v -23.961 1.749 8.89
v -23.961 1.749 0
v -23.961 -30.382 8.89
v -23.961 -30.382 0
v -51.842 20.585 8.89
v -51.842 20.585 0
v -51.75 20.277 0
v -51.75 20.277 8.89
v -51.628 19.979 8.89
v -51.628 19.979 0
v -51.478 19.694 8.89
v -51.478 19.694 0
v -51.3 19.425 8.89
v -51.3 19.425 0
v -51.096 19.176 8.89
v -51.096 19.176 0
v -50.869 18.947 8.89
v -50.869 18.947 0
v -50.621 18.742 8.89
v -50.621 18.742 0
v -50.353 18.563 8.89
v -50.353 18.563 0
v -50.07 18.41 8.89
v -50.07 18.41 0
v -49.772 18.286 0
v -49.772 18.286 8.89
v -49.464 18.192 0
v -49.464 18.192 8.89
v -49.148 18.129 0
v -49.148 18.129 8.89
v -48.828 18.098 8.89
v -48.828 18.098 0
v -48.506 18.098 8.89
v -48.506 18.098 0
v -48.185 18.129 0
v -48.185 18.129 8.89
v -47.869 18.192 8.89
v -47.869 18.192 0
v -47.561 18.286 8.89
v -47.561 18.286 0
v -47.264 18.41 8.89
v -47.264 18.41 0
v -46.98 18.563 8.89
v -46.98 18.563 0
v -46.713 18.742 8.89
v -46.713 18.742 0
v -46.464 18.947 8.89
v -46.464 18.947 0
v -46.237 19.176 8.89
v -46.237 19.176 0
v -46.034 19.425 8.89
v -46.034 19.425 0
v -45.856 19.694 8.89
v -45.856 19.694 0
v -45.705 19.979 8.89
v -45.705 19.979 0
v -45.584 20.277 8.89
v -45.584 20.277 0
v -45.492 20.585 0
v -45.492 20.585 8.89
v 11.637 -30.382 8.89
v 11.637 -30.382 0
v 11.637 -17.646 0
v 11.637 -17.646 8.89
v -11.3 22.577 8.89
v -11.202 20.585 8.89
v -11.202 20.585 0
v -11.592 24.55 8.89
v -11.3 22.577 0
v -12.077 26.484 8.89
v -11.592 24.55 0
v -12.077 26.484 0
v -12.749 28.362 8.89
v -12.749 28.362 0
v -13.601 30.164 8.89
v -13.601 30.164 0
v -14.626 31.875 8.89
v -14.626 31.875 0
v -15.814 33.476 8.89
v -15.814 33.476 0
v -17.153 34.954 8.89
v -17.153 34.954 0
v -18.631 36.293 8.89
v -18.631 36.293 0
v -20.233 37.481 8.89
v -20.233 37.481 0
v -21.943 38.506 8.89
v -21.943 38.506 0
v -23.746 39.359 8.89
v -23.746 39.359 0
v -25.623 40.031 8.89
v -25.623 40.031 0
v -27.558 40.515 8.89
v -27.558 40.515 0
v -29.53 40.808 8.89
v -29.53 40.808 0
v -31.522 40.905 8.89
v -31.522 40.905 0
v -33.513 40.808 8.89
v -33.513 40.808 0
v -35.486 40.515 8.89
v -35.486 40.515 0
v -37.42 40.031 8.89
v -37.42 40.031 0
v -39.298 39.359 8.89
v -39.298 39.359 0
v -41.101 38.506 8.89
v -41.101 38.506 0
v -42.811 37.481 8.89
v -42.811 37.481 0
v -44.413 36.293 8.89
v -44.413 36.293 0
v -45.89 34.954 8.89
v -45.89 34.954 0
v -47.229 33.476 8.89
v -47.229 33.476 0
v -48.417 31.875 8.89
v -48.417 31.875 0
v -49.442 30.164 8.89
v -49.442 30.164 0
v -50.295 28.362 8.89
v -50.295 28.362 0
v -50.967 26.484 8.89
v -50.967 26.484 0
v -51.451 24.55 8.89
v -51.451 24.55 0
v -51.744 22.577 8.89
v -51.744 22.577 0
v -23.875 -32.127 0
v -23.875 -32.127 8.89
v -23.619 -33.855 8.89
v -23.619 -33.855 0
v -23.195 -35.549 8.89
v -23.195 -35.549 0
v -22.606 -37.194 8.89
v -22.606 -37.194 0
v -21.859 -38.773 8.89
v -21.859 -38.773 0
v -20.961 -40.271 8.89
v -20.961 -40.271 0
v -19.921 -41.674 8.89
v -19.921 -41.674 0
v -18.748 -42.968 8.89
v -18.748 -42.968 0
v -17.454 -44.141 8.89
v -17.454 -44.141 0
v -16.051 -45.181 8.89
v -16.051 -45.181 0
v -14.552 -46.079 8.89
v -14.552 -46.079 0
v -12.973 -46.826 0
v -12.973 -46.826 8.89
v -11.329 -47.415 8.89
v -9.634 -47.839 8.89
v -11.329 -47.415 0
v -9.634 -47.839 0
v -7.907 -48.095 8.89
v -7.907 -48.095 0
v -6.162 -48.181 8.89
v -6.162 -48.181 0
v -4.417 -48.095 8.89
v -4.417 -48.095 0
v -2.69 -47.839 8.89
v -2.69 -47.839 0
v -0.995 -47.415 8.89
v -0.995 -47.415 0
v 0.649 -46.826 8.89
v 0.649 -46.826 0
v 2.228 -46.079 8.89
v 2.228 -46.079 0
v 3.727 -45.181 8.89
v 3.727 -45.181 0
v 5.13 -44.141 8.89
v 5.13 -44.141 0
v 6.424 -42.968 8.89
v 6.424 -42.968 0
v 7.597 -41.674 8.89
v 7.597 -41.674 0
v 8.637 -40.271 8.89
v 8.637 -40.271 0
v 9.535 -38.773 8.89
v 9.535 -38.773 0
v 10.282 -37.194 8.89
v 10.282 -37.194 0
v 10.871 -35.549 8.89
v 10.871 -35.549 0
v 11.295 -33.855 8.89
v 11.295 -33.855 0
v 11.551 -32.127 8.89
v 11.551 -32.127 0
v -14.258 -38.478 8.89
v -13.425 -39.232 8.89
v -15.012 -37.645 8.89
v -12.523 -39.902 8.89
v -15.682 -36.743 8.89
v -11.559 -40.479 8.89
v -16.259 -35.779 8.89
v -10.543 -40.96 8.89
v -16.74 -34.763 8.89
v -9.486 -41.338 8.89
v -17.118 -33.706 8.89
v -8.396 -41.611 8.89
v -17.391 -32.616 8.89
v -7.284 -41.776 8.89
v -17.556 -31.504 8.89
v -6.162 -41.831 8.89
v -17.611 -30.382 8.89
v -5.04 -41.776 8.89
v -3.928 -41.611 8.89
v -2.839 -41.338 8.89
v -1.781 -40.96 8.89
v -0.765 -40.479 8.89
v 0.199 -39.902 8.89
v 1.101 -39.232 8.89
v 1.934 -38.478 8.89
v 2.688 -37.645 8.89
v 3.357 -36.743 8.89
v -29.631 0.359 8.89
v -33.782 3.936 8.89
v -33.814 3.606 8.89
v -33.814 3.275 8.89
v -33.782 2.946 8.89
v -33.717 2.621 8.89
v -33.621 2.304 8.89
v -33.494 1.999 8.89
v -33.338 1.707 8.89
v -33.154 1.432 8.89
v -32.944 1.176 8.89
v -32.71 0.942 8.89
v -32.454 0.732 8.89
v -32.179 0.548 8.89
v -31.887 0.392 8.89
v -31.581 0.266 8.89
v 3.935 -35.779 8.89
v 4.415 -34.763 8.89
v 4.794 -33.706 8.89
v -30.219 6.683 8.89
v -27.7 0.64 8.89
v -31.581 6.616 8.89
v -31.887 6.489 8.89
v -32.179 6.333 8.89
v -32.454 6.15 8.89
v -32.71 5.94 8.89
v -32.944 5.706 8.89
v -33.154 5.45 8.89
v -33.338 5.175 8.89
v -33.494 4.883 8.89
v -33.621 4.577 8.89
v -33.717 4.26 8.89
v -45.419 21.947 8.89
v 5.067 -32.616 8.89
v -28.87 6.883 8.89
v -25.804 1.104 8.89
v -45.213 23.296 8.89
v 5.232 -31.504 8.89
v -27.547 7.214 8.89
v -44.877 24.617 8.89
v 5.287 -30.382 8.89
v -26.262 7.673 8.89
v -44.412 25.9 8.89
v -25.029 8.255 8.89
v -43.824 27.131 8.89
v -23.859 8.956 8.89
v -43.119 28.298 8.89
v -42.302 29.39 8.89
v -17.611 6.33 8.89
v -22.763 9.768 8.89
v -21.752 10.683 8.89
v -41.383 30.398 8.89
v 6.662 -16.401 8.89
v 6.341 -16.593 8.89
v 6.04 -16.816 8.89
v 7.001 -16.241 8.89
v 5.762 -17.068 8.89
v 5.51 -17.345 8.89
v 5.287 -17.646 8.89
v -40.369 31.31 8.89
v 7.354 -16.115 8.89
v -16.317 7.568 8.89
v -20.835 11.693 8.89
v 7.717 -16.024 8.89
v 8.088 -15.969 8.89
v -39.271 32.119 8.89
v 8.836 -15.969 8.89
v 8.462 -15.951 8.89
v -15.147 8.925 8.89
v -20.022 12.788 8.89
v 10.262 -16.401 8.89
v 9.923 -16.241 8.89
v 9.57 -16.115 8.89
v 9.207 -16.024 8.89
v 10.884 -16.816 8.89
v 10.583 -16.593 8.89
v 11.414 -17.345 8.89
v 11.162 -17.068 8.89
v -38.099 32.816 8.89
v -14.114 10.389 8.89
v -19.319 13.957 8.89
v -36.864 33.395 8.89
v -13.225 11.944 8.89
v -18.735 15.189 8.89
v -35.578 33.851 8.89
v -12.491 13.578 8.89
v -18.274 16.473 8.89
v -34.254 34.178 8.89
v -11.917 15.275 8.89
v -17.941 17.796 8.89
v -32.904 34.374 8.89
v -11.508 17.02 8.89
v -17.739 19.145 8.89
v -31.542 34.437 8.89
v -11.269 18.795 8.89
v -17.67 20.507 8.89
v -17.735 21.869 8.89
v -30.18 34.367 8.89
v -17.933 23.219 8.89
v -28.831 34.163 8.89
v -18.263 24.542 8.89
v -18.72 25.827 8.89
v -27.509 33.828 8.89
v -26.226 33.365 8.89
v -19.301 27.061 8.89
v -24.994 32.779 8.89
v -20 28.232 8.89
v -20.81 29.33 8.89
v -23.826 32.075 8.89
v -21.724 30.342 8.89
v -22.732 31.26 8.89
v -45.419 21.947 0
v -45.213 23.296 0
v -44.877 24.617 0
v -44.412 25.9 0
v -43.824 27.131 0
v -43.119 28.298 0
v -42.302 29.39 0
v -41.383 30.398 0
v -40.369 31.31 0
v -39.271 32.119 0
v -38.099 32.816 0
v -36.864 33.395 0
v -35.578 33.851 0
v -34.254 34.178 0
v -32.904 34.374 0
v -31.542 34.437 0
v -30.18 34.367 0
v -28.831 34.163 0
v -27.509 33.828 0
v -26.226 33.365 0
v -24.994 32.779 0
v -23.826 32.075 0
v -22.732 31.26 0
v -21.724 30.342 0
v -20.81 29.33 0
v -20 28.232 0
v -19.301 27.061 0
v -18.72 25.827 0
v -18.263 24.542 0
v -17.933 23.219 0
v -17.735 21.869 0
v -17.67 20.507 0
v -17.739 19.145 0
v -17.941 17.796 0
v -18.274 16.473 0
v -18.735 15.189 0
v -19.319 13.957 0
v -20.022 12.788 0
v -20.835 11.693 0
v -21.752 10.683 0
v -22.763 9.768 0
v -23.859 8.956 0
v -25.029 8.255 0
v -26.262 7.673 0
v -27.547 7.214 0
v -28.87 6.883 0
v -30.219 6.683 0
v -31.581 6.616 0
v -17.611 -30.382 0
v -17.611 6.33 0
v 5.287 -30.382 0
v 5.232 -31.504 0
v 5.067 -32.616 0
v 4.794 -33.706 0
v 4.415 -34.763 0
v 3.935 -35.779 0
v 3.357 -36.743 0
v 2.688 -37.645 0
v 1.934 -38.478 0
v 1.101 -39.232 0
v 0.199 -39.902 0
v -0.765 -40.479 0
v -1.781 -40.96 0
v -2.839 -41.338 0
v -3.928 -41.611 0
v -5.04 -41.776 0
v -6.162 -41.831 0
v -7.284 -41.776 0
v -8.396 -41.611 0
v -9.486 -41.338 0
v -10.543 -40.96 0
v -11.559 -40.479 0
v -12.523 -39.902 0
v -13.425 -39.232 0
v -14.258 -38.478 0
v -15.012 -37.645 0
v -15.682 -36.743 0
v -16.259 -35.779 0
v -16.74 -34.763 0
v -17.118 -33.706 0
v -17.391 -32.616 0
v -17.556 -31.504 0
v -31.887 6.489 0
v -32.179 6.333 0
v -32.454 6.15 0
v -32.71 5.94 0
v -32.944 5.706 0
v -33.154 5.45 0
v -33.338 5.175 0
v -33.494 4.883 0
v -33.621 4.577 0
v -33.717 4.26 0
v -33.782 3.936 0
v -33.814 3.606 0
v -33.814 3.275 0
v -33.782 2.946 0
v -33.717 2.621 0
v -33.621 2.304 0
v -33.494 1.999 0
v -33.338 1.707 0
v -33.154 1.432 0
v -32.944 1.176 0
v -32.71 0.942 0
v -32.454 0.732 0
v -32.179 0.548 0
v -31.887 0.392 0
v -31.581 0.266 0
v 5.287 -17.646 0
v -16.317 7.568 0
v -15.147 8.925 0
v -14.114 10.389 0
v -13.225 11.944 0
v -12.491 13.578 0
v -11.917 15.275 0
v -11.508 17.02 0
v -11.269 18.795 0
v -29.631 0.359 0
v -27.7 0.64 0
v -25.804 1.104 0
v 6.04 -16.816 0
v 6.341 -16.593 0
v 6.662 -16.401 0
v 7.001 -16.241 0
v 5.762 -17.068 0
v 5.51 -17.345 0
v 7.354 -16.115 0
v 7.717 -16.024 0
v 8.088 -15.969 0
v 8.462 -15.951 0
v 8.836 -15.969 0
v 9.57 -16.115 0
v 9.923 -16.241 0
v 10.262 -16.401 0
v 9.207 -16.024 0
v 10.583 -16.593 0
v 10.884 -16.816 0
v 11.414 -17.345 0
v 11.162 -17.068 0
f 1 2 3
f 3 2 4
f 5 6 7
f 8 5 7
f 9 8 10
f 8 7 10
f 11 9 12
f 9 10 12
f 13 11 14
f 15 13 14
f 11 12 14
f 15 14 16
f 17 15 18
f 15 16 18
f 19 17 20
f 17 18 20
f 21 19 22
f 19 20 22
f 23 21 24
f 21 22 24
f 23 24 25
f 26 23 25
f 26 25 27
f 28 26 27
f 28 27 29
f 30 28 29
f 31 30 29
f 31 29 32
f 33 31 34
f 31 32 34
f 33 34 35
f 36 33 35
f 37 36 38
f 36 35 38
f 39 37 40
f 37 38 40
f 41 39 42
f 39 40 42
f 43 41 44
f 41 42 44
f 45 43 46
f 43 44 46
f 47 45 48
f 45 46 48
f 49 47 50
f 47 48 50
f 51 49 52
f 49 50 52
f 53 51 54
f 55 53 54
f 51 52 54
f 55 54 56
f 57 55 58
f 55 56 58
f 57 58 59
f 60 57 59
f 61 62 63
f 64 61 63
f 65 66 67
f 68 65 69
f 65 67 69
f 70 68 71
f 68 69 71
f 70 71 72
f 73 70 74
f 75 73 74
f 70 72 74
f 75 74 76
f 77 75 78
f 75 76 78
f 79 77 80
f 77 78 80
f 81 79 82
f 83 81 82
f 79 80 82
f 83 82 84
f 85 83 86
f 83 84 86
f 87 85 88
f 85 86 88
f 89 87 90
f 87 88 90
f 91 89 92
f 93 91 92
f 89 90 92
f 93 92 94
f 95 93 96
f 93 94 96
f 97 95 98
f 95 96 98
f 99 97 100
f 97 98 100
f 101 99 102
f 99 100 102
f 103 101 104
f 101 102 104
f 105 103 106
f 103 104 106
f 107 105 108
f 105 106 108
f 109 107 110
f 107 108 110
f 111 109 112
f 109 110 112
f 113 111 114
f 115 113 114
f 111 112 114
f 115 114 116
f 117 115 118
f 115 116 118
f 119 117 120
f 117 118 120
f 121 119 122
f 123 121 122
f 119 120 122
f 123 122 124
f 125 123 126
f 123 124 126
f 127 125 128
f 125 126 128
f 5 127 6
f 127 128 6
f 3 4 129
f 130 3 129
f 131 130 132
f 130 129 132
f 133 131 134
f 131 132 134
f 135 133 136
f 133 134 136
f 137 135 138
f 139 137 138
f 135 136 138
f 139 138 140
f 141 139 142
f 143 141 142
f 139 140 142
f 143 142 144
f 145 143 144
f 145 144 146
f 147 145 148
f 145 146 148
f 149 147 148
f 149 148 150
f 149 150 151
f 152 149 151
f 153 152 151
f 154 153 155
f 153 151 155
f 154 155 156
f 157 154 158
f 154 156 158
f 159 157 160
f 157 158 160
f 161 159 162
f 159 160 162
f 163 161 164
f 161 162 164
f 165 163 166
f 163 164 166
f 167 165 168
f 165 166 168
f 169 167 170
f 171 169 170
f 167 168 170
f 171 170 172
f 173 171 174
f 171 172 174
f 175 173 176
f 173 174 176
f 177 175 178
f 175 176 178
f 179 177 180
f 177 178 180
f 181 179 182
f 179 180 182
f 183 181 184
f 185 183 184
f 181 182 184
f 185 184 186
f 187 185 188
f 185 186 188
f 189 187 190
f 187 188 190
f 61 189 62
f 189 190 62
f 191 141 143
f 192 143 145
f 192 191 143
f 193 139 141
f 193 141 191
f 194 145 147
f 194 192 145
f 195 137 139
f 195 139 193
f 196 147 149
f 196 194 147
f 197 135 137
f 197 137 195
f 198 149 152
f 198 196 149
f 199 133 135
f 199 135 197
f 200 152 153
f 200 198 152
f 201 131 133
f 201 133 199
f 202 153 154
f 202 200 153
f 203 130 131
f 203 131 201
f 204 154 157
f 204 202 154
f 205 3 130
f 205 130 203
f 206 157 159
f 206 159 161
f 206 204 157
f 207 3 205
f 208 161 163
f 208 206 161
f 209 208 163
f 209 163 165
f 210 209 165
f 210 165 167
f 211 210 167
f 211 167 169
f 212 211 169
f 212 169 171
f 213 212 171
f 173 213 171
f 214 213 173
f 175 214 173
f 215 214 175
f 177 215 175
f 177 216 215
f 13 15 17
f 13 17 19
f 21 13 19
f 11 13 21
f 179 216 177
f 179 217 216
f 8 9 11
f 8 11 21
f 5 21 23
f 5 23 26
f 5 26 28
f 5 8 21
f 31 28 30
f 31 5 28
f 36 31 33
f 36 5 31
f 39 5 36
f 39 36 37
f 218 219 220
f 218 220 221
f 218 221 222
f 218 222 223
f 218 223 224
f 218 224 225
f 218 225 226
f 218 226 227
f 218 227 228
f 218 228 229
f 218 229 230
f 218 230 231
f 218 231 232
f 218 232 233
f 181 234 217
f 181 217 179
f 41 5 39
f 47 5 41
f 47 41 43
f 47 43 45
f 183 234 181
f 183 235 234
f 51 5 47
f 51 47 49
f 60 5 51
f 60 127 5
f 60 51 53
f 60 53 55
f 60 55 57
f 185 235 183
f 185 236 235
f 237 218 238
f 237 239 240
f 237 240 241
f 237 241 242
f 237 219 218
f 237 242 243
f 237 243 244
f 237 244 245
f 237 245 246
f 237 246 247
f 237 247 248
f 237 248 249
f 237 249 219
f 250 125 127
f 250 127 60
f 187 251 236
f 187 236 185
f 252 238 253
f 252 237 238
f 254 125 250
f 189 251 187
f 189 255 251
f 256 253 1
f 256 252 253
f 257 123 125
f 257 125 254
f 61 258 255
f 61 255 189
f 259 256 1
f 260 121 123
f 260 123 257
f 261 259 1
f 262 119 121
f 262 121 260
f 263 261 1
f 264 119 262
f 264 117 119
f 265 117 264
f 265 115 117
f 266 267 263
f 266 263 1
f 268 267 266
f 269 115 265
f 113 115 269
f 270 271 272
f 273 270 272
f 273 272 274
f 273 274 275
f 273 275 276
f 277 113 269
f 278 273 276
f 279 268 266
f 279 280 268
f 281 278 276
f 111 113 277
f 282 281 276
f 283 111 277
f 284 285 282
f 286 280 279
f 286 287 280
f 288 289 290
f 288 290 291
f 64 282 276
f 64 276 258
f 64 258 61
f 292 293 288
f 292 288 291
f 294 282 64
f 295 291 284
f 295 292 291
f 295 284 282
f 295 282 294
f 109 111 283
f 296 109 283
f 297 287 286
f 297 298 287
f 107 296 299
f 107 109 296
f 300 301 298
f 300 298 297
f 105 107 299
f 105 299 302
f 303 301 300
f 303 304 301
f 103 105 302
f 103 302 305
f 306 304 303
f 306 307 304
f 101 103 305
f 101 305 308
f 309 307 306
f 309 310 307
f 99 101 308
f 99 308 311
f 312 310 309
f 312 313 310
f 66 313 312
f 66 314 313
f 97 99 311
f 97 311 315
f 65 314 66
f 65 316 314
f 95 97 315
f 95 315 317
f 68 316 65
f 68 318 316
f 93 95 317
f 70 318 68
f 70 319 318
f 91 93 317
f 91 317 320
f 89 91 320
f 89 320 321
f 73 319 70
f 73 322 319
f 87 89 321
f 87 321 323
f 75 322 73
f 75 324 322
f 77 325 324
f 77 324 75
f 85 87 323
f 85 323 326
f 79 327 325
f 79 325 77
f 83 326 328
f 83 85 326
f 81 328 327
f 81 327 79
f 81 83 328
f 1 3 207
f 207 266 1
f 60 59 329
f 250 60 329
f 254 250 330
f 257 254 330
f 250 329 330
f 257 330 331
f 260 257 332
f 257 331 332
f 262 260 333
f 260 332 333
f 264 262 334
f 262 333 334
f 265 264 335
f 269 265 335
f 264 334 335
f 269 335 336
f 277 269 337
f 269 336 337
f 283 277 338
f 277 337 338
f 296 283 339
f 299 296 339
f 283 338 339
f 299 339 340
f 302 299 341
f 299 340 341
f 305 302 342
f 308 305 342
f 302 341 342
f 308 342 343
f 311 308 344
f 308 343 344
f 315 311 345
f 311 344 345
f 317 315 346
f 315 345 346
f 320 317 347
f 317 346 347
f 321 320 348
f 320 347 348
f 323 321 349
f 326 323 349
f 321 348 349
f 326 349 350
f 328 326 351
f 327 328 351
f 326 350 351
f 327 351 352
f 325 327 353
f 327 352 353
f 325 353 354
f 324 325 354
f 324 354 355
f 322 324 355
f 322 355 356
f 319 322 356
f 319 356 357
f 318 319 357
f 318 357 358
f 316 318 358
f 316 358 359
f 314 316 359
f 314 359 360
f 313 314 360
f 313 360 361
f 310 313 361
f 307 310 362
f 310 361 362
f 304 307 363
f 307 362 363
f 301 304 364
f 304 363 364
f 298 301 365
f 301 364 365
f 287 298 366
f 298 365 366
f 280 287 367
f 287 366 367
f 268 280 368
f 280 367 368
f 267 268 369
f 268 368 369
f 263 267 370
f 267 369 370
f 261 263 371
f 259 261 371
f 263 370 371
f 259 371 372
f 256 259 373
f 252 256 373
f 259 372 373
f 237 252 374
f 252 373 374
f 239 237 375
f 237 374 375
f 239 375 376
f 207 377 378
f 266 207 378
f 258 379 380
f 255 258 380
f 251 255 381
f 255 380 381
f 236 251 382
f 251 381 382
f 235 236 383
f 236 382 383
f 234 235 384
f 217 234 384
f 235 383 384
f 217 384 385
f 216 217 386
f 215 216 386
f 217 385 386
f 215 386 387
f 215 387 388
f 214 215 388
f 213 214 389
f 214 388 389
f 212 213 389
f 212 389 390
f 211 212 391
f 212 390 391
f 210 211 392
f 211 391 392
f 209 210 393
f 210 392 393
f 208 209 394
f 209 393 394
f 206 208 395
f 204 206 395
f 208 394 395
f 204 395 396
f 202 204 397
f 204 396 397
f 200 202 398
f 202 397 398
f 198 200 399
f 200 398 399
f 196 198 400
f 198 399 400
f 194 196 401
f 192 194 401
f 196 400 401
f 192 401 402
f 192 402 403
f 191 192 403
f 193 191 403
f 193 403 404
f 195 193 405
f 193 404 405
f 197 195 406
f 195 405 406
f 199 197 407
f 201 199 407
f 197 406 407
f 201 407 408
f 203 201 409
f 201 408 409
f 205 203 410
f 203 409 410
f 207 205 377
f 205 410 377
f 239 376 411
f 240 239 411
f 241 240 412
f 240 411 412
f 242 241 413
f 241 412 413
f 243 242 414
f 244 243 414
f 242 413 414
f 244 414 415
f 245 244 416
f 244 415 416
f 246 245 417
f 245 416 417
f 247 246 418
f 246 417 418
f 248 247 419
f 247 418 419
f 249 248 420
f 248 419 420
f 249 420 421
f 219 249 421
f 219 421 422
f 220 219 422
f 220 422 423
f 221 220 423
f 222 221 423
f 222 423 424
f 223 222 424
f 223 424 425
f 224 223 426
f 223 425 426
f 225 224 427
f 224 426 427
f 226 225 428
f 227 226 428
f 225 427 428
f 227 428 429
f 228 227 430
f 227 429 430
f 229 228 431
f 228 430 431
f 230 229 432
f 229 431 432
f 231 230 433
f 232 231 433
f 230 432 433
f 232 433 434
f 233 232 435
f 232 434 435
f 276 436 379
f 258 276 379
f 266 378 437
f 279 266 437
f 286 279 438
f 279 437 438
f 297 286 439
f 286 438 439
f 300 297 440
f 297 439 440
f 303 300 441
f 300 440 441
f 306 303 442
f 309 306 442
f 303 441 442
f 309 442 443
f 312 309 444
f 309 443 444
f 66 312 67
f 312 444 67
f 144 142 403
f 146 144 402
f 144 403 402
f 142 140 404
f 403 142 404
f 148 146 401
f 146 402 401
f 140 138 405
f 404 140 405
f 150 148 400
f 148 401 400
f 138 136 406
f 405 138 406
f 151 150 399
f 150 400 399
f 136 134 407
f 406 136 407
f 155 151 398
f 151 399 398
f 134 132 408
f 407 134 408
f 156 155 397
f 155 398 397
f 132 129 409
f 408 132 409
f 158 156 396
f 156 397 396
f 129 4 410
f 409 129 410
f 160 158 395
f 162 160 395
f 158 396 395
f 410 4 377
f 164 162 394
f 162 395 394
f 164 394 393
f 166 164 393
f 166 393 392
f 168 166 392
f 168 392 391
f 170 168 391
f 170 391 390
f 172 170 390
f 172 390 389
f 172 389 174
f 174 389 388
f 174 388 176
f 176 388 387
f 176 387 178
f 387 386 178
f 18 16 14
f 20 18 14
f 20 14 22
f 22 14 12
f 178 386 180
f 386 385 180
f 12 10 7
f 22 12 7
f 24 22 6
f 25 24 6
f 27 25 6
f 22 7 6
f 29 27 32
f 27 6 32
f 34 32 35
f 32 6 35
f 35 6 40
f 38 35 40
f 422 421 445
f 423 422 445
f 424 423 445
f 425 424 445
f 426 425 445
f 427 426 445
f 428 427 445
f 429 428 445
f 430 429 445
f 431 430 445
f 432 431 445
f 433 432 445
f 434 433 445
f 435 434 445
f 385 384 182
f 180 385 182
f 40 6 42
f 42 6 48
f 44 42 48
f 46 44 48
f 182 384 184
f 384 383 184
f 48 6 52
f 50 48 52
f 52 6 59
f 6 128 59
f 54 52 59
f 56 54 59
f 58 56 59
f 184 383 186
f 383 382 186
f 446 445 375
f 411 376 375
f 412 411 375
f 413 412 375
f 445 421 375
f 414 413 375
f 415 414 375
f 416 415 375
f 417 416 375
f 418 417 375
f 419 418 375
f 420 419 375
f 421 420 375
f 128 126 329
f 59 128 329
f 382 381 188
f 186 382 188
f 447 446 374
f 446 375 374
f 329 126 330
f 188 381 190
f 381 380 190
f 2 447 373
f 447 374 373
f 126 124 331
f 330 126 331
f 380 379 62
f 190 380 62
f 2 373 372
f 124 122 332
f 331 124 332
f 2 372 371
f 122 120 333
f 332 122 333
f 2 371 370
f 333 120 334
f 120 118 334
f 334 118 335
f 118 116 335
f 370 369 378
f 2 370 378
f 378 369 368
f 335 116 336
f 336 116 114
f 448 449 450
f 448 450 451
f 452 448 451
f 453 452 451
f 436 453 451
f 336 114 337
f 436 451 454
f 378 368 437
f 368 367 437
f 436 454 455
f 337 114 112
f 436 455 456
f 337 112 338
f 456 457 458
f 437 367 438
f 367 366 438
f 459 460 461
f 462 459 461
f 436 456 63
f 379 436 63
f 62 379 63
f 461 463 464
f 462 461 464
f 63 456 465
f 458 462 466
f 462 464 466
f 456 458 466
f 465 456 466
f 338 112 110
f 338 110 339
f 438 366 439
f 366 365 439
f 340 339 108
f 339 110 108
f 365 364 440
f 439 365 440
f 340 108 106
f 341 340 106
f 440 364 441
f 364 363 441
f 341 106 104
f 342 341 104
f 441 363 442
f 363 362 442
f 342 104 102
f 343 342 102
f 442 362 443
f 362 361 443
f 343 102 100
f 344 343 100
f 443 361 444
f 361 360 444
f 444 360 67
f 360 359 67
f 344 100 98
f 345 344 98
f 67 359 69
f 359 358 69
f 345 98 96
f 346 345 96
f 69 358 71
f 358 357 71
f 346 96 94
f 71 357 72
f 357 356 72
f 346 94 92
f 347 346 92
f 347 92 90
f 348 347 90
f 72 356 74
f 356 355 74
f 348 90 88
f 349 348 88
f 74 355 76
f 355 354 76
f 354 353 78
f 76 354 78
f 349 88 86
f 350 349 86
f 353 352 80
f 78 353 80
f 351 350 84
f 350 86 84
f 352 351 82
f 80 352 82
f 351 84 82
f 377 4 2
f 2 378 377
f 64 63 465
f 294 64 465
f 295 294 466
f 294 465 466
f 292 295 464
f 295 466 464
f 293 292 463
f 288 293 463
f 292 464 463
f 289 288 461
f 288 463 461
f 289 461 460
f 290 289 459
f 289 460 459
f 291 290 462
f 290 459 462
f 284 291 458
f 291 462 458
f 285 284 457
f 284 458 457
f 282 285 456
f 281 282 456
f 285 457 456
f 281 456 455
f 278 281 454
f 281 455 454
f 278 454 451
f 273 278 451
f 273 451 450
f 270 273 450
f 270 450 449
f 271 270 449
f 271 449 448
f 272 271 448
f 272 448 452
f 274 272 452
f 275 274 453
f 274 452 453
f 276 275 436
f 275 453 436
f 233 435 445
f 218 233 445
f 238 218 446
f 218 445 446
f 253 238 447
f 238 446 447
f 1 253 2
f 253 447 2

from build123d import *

# Parameters (mm, degrees)
F1_DEPTH = 8.89


with BuildPart() as f1:
    # F0 (on Top) → F1 (new body)
    with BuildSketch(Plane.XY):
        with BuildLine():
            ThreePointArc((-31.581117, 0.265729), (-27.699647, 0.639888), (-23.961117, 1.748585))
            Line((-23.961117, 1.748585), (-23.961117, -30.38213))
            ThreePointArc((-23.961117, -30.38213), (-6.162074, -48.181174), (11.636969, -30.38213))
            Line((11.636969, -30.38213), (11.636969, -17.645674))
            ThreePointArc((11.636969, -17.645674), (8.461969, -15.95073), (5.286969, -17.645674))
            Line((5.286969, -17.645674), (5.286969, -30.38213))
            ThreePointArc((5.286969, -30.38213), (-6.162074, -41.831174), (-17.611117, -30.38213))
            Line((-17.611117, -30.38213), (-17.611117, 6.329739))
            ThreePointArc((-17.611117, 6.329739), (-12.838442, 12.752636), (-11.20179, 20.585477))
            ThreePointArc((-11.20179, 20.585477), (-31.52179, 40.905477), (-51.84179, 20.585477))
            ThreePointArc((-51.84179, 20.585477), (-48.66679, 18.093724), (-45.49179, 20.585477))
            ThreePointArc((-45.49179, 20.585477), (-21.723878, 30.34208), (-31.581117, 6.615729))
            ThreePointArc((-31.581117, 6.615729), (-33.818332, 3.440729), (-31.581117, 0.265729))
        make_face()
    extrude(amount=F1_DEPTH)


solid = f1.part
